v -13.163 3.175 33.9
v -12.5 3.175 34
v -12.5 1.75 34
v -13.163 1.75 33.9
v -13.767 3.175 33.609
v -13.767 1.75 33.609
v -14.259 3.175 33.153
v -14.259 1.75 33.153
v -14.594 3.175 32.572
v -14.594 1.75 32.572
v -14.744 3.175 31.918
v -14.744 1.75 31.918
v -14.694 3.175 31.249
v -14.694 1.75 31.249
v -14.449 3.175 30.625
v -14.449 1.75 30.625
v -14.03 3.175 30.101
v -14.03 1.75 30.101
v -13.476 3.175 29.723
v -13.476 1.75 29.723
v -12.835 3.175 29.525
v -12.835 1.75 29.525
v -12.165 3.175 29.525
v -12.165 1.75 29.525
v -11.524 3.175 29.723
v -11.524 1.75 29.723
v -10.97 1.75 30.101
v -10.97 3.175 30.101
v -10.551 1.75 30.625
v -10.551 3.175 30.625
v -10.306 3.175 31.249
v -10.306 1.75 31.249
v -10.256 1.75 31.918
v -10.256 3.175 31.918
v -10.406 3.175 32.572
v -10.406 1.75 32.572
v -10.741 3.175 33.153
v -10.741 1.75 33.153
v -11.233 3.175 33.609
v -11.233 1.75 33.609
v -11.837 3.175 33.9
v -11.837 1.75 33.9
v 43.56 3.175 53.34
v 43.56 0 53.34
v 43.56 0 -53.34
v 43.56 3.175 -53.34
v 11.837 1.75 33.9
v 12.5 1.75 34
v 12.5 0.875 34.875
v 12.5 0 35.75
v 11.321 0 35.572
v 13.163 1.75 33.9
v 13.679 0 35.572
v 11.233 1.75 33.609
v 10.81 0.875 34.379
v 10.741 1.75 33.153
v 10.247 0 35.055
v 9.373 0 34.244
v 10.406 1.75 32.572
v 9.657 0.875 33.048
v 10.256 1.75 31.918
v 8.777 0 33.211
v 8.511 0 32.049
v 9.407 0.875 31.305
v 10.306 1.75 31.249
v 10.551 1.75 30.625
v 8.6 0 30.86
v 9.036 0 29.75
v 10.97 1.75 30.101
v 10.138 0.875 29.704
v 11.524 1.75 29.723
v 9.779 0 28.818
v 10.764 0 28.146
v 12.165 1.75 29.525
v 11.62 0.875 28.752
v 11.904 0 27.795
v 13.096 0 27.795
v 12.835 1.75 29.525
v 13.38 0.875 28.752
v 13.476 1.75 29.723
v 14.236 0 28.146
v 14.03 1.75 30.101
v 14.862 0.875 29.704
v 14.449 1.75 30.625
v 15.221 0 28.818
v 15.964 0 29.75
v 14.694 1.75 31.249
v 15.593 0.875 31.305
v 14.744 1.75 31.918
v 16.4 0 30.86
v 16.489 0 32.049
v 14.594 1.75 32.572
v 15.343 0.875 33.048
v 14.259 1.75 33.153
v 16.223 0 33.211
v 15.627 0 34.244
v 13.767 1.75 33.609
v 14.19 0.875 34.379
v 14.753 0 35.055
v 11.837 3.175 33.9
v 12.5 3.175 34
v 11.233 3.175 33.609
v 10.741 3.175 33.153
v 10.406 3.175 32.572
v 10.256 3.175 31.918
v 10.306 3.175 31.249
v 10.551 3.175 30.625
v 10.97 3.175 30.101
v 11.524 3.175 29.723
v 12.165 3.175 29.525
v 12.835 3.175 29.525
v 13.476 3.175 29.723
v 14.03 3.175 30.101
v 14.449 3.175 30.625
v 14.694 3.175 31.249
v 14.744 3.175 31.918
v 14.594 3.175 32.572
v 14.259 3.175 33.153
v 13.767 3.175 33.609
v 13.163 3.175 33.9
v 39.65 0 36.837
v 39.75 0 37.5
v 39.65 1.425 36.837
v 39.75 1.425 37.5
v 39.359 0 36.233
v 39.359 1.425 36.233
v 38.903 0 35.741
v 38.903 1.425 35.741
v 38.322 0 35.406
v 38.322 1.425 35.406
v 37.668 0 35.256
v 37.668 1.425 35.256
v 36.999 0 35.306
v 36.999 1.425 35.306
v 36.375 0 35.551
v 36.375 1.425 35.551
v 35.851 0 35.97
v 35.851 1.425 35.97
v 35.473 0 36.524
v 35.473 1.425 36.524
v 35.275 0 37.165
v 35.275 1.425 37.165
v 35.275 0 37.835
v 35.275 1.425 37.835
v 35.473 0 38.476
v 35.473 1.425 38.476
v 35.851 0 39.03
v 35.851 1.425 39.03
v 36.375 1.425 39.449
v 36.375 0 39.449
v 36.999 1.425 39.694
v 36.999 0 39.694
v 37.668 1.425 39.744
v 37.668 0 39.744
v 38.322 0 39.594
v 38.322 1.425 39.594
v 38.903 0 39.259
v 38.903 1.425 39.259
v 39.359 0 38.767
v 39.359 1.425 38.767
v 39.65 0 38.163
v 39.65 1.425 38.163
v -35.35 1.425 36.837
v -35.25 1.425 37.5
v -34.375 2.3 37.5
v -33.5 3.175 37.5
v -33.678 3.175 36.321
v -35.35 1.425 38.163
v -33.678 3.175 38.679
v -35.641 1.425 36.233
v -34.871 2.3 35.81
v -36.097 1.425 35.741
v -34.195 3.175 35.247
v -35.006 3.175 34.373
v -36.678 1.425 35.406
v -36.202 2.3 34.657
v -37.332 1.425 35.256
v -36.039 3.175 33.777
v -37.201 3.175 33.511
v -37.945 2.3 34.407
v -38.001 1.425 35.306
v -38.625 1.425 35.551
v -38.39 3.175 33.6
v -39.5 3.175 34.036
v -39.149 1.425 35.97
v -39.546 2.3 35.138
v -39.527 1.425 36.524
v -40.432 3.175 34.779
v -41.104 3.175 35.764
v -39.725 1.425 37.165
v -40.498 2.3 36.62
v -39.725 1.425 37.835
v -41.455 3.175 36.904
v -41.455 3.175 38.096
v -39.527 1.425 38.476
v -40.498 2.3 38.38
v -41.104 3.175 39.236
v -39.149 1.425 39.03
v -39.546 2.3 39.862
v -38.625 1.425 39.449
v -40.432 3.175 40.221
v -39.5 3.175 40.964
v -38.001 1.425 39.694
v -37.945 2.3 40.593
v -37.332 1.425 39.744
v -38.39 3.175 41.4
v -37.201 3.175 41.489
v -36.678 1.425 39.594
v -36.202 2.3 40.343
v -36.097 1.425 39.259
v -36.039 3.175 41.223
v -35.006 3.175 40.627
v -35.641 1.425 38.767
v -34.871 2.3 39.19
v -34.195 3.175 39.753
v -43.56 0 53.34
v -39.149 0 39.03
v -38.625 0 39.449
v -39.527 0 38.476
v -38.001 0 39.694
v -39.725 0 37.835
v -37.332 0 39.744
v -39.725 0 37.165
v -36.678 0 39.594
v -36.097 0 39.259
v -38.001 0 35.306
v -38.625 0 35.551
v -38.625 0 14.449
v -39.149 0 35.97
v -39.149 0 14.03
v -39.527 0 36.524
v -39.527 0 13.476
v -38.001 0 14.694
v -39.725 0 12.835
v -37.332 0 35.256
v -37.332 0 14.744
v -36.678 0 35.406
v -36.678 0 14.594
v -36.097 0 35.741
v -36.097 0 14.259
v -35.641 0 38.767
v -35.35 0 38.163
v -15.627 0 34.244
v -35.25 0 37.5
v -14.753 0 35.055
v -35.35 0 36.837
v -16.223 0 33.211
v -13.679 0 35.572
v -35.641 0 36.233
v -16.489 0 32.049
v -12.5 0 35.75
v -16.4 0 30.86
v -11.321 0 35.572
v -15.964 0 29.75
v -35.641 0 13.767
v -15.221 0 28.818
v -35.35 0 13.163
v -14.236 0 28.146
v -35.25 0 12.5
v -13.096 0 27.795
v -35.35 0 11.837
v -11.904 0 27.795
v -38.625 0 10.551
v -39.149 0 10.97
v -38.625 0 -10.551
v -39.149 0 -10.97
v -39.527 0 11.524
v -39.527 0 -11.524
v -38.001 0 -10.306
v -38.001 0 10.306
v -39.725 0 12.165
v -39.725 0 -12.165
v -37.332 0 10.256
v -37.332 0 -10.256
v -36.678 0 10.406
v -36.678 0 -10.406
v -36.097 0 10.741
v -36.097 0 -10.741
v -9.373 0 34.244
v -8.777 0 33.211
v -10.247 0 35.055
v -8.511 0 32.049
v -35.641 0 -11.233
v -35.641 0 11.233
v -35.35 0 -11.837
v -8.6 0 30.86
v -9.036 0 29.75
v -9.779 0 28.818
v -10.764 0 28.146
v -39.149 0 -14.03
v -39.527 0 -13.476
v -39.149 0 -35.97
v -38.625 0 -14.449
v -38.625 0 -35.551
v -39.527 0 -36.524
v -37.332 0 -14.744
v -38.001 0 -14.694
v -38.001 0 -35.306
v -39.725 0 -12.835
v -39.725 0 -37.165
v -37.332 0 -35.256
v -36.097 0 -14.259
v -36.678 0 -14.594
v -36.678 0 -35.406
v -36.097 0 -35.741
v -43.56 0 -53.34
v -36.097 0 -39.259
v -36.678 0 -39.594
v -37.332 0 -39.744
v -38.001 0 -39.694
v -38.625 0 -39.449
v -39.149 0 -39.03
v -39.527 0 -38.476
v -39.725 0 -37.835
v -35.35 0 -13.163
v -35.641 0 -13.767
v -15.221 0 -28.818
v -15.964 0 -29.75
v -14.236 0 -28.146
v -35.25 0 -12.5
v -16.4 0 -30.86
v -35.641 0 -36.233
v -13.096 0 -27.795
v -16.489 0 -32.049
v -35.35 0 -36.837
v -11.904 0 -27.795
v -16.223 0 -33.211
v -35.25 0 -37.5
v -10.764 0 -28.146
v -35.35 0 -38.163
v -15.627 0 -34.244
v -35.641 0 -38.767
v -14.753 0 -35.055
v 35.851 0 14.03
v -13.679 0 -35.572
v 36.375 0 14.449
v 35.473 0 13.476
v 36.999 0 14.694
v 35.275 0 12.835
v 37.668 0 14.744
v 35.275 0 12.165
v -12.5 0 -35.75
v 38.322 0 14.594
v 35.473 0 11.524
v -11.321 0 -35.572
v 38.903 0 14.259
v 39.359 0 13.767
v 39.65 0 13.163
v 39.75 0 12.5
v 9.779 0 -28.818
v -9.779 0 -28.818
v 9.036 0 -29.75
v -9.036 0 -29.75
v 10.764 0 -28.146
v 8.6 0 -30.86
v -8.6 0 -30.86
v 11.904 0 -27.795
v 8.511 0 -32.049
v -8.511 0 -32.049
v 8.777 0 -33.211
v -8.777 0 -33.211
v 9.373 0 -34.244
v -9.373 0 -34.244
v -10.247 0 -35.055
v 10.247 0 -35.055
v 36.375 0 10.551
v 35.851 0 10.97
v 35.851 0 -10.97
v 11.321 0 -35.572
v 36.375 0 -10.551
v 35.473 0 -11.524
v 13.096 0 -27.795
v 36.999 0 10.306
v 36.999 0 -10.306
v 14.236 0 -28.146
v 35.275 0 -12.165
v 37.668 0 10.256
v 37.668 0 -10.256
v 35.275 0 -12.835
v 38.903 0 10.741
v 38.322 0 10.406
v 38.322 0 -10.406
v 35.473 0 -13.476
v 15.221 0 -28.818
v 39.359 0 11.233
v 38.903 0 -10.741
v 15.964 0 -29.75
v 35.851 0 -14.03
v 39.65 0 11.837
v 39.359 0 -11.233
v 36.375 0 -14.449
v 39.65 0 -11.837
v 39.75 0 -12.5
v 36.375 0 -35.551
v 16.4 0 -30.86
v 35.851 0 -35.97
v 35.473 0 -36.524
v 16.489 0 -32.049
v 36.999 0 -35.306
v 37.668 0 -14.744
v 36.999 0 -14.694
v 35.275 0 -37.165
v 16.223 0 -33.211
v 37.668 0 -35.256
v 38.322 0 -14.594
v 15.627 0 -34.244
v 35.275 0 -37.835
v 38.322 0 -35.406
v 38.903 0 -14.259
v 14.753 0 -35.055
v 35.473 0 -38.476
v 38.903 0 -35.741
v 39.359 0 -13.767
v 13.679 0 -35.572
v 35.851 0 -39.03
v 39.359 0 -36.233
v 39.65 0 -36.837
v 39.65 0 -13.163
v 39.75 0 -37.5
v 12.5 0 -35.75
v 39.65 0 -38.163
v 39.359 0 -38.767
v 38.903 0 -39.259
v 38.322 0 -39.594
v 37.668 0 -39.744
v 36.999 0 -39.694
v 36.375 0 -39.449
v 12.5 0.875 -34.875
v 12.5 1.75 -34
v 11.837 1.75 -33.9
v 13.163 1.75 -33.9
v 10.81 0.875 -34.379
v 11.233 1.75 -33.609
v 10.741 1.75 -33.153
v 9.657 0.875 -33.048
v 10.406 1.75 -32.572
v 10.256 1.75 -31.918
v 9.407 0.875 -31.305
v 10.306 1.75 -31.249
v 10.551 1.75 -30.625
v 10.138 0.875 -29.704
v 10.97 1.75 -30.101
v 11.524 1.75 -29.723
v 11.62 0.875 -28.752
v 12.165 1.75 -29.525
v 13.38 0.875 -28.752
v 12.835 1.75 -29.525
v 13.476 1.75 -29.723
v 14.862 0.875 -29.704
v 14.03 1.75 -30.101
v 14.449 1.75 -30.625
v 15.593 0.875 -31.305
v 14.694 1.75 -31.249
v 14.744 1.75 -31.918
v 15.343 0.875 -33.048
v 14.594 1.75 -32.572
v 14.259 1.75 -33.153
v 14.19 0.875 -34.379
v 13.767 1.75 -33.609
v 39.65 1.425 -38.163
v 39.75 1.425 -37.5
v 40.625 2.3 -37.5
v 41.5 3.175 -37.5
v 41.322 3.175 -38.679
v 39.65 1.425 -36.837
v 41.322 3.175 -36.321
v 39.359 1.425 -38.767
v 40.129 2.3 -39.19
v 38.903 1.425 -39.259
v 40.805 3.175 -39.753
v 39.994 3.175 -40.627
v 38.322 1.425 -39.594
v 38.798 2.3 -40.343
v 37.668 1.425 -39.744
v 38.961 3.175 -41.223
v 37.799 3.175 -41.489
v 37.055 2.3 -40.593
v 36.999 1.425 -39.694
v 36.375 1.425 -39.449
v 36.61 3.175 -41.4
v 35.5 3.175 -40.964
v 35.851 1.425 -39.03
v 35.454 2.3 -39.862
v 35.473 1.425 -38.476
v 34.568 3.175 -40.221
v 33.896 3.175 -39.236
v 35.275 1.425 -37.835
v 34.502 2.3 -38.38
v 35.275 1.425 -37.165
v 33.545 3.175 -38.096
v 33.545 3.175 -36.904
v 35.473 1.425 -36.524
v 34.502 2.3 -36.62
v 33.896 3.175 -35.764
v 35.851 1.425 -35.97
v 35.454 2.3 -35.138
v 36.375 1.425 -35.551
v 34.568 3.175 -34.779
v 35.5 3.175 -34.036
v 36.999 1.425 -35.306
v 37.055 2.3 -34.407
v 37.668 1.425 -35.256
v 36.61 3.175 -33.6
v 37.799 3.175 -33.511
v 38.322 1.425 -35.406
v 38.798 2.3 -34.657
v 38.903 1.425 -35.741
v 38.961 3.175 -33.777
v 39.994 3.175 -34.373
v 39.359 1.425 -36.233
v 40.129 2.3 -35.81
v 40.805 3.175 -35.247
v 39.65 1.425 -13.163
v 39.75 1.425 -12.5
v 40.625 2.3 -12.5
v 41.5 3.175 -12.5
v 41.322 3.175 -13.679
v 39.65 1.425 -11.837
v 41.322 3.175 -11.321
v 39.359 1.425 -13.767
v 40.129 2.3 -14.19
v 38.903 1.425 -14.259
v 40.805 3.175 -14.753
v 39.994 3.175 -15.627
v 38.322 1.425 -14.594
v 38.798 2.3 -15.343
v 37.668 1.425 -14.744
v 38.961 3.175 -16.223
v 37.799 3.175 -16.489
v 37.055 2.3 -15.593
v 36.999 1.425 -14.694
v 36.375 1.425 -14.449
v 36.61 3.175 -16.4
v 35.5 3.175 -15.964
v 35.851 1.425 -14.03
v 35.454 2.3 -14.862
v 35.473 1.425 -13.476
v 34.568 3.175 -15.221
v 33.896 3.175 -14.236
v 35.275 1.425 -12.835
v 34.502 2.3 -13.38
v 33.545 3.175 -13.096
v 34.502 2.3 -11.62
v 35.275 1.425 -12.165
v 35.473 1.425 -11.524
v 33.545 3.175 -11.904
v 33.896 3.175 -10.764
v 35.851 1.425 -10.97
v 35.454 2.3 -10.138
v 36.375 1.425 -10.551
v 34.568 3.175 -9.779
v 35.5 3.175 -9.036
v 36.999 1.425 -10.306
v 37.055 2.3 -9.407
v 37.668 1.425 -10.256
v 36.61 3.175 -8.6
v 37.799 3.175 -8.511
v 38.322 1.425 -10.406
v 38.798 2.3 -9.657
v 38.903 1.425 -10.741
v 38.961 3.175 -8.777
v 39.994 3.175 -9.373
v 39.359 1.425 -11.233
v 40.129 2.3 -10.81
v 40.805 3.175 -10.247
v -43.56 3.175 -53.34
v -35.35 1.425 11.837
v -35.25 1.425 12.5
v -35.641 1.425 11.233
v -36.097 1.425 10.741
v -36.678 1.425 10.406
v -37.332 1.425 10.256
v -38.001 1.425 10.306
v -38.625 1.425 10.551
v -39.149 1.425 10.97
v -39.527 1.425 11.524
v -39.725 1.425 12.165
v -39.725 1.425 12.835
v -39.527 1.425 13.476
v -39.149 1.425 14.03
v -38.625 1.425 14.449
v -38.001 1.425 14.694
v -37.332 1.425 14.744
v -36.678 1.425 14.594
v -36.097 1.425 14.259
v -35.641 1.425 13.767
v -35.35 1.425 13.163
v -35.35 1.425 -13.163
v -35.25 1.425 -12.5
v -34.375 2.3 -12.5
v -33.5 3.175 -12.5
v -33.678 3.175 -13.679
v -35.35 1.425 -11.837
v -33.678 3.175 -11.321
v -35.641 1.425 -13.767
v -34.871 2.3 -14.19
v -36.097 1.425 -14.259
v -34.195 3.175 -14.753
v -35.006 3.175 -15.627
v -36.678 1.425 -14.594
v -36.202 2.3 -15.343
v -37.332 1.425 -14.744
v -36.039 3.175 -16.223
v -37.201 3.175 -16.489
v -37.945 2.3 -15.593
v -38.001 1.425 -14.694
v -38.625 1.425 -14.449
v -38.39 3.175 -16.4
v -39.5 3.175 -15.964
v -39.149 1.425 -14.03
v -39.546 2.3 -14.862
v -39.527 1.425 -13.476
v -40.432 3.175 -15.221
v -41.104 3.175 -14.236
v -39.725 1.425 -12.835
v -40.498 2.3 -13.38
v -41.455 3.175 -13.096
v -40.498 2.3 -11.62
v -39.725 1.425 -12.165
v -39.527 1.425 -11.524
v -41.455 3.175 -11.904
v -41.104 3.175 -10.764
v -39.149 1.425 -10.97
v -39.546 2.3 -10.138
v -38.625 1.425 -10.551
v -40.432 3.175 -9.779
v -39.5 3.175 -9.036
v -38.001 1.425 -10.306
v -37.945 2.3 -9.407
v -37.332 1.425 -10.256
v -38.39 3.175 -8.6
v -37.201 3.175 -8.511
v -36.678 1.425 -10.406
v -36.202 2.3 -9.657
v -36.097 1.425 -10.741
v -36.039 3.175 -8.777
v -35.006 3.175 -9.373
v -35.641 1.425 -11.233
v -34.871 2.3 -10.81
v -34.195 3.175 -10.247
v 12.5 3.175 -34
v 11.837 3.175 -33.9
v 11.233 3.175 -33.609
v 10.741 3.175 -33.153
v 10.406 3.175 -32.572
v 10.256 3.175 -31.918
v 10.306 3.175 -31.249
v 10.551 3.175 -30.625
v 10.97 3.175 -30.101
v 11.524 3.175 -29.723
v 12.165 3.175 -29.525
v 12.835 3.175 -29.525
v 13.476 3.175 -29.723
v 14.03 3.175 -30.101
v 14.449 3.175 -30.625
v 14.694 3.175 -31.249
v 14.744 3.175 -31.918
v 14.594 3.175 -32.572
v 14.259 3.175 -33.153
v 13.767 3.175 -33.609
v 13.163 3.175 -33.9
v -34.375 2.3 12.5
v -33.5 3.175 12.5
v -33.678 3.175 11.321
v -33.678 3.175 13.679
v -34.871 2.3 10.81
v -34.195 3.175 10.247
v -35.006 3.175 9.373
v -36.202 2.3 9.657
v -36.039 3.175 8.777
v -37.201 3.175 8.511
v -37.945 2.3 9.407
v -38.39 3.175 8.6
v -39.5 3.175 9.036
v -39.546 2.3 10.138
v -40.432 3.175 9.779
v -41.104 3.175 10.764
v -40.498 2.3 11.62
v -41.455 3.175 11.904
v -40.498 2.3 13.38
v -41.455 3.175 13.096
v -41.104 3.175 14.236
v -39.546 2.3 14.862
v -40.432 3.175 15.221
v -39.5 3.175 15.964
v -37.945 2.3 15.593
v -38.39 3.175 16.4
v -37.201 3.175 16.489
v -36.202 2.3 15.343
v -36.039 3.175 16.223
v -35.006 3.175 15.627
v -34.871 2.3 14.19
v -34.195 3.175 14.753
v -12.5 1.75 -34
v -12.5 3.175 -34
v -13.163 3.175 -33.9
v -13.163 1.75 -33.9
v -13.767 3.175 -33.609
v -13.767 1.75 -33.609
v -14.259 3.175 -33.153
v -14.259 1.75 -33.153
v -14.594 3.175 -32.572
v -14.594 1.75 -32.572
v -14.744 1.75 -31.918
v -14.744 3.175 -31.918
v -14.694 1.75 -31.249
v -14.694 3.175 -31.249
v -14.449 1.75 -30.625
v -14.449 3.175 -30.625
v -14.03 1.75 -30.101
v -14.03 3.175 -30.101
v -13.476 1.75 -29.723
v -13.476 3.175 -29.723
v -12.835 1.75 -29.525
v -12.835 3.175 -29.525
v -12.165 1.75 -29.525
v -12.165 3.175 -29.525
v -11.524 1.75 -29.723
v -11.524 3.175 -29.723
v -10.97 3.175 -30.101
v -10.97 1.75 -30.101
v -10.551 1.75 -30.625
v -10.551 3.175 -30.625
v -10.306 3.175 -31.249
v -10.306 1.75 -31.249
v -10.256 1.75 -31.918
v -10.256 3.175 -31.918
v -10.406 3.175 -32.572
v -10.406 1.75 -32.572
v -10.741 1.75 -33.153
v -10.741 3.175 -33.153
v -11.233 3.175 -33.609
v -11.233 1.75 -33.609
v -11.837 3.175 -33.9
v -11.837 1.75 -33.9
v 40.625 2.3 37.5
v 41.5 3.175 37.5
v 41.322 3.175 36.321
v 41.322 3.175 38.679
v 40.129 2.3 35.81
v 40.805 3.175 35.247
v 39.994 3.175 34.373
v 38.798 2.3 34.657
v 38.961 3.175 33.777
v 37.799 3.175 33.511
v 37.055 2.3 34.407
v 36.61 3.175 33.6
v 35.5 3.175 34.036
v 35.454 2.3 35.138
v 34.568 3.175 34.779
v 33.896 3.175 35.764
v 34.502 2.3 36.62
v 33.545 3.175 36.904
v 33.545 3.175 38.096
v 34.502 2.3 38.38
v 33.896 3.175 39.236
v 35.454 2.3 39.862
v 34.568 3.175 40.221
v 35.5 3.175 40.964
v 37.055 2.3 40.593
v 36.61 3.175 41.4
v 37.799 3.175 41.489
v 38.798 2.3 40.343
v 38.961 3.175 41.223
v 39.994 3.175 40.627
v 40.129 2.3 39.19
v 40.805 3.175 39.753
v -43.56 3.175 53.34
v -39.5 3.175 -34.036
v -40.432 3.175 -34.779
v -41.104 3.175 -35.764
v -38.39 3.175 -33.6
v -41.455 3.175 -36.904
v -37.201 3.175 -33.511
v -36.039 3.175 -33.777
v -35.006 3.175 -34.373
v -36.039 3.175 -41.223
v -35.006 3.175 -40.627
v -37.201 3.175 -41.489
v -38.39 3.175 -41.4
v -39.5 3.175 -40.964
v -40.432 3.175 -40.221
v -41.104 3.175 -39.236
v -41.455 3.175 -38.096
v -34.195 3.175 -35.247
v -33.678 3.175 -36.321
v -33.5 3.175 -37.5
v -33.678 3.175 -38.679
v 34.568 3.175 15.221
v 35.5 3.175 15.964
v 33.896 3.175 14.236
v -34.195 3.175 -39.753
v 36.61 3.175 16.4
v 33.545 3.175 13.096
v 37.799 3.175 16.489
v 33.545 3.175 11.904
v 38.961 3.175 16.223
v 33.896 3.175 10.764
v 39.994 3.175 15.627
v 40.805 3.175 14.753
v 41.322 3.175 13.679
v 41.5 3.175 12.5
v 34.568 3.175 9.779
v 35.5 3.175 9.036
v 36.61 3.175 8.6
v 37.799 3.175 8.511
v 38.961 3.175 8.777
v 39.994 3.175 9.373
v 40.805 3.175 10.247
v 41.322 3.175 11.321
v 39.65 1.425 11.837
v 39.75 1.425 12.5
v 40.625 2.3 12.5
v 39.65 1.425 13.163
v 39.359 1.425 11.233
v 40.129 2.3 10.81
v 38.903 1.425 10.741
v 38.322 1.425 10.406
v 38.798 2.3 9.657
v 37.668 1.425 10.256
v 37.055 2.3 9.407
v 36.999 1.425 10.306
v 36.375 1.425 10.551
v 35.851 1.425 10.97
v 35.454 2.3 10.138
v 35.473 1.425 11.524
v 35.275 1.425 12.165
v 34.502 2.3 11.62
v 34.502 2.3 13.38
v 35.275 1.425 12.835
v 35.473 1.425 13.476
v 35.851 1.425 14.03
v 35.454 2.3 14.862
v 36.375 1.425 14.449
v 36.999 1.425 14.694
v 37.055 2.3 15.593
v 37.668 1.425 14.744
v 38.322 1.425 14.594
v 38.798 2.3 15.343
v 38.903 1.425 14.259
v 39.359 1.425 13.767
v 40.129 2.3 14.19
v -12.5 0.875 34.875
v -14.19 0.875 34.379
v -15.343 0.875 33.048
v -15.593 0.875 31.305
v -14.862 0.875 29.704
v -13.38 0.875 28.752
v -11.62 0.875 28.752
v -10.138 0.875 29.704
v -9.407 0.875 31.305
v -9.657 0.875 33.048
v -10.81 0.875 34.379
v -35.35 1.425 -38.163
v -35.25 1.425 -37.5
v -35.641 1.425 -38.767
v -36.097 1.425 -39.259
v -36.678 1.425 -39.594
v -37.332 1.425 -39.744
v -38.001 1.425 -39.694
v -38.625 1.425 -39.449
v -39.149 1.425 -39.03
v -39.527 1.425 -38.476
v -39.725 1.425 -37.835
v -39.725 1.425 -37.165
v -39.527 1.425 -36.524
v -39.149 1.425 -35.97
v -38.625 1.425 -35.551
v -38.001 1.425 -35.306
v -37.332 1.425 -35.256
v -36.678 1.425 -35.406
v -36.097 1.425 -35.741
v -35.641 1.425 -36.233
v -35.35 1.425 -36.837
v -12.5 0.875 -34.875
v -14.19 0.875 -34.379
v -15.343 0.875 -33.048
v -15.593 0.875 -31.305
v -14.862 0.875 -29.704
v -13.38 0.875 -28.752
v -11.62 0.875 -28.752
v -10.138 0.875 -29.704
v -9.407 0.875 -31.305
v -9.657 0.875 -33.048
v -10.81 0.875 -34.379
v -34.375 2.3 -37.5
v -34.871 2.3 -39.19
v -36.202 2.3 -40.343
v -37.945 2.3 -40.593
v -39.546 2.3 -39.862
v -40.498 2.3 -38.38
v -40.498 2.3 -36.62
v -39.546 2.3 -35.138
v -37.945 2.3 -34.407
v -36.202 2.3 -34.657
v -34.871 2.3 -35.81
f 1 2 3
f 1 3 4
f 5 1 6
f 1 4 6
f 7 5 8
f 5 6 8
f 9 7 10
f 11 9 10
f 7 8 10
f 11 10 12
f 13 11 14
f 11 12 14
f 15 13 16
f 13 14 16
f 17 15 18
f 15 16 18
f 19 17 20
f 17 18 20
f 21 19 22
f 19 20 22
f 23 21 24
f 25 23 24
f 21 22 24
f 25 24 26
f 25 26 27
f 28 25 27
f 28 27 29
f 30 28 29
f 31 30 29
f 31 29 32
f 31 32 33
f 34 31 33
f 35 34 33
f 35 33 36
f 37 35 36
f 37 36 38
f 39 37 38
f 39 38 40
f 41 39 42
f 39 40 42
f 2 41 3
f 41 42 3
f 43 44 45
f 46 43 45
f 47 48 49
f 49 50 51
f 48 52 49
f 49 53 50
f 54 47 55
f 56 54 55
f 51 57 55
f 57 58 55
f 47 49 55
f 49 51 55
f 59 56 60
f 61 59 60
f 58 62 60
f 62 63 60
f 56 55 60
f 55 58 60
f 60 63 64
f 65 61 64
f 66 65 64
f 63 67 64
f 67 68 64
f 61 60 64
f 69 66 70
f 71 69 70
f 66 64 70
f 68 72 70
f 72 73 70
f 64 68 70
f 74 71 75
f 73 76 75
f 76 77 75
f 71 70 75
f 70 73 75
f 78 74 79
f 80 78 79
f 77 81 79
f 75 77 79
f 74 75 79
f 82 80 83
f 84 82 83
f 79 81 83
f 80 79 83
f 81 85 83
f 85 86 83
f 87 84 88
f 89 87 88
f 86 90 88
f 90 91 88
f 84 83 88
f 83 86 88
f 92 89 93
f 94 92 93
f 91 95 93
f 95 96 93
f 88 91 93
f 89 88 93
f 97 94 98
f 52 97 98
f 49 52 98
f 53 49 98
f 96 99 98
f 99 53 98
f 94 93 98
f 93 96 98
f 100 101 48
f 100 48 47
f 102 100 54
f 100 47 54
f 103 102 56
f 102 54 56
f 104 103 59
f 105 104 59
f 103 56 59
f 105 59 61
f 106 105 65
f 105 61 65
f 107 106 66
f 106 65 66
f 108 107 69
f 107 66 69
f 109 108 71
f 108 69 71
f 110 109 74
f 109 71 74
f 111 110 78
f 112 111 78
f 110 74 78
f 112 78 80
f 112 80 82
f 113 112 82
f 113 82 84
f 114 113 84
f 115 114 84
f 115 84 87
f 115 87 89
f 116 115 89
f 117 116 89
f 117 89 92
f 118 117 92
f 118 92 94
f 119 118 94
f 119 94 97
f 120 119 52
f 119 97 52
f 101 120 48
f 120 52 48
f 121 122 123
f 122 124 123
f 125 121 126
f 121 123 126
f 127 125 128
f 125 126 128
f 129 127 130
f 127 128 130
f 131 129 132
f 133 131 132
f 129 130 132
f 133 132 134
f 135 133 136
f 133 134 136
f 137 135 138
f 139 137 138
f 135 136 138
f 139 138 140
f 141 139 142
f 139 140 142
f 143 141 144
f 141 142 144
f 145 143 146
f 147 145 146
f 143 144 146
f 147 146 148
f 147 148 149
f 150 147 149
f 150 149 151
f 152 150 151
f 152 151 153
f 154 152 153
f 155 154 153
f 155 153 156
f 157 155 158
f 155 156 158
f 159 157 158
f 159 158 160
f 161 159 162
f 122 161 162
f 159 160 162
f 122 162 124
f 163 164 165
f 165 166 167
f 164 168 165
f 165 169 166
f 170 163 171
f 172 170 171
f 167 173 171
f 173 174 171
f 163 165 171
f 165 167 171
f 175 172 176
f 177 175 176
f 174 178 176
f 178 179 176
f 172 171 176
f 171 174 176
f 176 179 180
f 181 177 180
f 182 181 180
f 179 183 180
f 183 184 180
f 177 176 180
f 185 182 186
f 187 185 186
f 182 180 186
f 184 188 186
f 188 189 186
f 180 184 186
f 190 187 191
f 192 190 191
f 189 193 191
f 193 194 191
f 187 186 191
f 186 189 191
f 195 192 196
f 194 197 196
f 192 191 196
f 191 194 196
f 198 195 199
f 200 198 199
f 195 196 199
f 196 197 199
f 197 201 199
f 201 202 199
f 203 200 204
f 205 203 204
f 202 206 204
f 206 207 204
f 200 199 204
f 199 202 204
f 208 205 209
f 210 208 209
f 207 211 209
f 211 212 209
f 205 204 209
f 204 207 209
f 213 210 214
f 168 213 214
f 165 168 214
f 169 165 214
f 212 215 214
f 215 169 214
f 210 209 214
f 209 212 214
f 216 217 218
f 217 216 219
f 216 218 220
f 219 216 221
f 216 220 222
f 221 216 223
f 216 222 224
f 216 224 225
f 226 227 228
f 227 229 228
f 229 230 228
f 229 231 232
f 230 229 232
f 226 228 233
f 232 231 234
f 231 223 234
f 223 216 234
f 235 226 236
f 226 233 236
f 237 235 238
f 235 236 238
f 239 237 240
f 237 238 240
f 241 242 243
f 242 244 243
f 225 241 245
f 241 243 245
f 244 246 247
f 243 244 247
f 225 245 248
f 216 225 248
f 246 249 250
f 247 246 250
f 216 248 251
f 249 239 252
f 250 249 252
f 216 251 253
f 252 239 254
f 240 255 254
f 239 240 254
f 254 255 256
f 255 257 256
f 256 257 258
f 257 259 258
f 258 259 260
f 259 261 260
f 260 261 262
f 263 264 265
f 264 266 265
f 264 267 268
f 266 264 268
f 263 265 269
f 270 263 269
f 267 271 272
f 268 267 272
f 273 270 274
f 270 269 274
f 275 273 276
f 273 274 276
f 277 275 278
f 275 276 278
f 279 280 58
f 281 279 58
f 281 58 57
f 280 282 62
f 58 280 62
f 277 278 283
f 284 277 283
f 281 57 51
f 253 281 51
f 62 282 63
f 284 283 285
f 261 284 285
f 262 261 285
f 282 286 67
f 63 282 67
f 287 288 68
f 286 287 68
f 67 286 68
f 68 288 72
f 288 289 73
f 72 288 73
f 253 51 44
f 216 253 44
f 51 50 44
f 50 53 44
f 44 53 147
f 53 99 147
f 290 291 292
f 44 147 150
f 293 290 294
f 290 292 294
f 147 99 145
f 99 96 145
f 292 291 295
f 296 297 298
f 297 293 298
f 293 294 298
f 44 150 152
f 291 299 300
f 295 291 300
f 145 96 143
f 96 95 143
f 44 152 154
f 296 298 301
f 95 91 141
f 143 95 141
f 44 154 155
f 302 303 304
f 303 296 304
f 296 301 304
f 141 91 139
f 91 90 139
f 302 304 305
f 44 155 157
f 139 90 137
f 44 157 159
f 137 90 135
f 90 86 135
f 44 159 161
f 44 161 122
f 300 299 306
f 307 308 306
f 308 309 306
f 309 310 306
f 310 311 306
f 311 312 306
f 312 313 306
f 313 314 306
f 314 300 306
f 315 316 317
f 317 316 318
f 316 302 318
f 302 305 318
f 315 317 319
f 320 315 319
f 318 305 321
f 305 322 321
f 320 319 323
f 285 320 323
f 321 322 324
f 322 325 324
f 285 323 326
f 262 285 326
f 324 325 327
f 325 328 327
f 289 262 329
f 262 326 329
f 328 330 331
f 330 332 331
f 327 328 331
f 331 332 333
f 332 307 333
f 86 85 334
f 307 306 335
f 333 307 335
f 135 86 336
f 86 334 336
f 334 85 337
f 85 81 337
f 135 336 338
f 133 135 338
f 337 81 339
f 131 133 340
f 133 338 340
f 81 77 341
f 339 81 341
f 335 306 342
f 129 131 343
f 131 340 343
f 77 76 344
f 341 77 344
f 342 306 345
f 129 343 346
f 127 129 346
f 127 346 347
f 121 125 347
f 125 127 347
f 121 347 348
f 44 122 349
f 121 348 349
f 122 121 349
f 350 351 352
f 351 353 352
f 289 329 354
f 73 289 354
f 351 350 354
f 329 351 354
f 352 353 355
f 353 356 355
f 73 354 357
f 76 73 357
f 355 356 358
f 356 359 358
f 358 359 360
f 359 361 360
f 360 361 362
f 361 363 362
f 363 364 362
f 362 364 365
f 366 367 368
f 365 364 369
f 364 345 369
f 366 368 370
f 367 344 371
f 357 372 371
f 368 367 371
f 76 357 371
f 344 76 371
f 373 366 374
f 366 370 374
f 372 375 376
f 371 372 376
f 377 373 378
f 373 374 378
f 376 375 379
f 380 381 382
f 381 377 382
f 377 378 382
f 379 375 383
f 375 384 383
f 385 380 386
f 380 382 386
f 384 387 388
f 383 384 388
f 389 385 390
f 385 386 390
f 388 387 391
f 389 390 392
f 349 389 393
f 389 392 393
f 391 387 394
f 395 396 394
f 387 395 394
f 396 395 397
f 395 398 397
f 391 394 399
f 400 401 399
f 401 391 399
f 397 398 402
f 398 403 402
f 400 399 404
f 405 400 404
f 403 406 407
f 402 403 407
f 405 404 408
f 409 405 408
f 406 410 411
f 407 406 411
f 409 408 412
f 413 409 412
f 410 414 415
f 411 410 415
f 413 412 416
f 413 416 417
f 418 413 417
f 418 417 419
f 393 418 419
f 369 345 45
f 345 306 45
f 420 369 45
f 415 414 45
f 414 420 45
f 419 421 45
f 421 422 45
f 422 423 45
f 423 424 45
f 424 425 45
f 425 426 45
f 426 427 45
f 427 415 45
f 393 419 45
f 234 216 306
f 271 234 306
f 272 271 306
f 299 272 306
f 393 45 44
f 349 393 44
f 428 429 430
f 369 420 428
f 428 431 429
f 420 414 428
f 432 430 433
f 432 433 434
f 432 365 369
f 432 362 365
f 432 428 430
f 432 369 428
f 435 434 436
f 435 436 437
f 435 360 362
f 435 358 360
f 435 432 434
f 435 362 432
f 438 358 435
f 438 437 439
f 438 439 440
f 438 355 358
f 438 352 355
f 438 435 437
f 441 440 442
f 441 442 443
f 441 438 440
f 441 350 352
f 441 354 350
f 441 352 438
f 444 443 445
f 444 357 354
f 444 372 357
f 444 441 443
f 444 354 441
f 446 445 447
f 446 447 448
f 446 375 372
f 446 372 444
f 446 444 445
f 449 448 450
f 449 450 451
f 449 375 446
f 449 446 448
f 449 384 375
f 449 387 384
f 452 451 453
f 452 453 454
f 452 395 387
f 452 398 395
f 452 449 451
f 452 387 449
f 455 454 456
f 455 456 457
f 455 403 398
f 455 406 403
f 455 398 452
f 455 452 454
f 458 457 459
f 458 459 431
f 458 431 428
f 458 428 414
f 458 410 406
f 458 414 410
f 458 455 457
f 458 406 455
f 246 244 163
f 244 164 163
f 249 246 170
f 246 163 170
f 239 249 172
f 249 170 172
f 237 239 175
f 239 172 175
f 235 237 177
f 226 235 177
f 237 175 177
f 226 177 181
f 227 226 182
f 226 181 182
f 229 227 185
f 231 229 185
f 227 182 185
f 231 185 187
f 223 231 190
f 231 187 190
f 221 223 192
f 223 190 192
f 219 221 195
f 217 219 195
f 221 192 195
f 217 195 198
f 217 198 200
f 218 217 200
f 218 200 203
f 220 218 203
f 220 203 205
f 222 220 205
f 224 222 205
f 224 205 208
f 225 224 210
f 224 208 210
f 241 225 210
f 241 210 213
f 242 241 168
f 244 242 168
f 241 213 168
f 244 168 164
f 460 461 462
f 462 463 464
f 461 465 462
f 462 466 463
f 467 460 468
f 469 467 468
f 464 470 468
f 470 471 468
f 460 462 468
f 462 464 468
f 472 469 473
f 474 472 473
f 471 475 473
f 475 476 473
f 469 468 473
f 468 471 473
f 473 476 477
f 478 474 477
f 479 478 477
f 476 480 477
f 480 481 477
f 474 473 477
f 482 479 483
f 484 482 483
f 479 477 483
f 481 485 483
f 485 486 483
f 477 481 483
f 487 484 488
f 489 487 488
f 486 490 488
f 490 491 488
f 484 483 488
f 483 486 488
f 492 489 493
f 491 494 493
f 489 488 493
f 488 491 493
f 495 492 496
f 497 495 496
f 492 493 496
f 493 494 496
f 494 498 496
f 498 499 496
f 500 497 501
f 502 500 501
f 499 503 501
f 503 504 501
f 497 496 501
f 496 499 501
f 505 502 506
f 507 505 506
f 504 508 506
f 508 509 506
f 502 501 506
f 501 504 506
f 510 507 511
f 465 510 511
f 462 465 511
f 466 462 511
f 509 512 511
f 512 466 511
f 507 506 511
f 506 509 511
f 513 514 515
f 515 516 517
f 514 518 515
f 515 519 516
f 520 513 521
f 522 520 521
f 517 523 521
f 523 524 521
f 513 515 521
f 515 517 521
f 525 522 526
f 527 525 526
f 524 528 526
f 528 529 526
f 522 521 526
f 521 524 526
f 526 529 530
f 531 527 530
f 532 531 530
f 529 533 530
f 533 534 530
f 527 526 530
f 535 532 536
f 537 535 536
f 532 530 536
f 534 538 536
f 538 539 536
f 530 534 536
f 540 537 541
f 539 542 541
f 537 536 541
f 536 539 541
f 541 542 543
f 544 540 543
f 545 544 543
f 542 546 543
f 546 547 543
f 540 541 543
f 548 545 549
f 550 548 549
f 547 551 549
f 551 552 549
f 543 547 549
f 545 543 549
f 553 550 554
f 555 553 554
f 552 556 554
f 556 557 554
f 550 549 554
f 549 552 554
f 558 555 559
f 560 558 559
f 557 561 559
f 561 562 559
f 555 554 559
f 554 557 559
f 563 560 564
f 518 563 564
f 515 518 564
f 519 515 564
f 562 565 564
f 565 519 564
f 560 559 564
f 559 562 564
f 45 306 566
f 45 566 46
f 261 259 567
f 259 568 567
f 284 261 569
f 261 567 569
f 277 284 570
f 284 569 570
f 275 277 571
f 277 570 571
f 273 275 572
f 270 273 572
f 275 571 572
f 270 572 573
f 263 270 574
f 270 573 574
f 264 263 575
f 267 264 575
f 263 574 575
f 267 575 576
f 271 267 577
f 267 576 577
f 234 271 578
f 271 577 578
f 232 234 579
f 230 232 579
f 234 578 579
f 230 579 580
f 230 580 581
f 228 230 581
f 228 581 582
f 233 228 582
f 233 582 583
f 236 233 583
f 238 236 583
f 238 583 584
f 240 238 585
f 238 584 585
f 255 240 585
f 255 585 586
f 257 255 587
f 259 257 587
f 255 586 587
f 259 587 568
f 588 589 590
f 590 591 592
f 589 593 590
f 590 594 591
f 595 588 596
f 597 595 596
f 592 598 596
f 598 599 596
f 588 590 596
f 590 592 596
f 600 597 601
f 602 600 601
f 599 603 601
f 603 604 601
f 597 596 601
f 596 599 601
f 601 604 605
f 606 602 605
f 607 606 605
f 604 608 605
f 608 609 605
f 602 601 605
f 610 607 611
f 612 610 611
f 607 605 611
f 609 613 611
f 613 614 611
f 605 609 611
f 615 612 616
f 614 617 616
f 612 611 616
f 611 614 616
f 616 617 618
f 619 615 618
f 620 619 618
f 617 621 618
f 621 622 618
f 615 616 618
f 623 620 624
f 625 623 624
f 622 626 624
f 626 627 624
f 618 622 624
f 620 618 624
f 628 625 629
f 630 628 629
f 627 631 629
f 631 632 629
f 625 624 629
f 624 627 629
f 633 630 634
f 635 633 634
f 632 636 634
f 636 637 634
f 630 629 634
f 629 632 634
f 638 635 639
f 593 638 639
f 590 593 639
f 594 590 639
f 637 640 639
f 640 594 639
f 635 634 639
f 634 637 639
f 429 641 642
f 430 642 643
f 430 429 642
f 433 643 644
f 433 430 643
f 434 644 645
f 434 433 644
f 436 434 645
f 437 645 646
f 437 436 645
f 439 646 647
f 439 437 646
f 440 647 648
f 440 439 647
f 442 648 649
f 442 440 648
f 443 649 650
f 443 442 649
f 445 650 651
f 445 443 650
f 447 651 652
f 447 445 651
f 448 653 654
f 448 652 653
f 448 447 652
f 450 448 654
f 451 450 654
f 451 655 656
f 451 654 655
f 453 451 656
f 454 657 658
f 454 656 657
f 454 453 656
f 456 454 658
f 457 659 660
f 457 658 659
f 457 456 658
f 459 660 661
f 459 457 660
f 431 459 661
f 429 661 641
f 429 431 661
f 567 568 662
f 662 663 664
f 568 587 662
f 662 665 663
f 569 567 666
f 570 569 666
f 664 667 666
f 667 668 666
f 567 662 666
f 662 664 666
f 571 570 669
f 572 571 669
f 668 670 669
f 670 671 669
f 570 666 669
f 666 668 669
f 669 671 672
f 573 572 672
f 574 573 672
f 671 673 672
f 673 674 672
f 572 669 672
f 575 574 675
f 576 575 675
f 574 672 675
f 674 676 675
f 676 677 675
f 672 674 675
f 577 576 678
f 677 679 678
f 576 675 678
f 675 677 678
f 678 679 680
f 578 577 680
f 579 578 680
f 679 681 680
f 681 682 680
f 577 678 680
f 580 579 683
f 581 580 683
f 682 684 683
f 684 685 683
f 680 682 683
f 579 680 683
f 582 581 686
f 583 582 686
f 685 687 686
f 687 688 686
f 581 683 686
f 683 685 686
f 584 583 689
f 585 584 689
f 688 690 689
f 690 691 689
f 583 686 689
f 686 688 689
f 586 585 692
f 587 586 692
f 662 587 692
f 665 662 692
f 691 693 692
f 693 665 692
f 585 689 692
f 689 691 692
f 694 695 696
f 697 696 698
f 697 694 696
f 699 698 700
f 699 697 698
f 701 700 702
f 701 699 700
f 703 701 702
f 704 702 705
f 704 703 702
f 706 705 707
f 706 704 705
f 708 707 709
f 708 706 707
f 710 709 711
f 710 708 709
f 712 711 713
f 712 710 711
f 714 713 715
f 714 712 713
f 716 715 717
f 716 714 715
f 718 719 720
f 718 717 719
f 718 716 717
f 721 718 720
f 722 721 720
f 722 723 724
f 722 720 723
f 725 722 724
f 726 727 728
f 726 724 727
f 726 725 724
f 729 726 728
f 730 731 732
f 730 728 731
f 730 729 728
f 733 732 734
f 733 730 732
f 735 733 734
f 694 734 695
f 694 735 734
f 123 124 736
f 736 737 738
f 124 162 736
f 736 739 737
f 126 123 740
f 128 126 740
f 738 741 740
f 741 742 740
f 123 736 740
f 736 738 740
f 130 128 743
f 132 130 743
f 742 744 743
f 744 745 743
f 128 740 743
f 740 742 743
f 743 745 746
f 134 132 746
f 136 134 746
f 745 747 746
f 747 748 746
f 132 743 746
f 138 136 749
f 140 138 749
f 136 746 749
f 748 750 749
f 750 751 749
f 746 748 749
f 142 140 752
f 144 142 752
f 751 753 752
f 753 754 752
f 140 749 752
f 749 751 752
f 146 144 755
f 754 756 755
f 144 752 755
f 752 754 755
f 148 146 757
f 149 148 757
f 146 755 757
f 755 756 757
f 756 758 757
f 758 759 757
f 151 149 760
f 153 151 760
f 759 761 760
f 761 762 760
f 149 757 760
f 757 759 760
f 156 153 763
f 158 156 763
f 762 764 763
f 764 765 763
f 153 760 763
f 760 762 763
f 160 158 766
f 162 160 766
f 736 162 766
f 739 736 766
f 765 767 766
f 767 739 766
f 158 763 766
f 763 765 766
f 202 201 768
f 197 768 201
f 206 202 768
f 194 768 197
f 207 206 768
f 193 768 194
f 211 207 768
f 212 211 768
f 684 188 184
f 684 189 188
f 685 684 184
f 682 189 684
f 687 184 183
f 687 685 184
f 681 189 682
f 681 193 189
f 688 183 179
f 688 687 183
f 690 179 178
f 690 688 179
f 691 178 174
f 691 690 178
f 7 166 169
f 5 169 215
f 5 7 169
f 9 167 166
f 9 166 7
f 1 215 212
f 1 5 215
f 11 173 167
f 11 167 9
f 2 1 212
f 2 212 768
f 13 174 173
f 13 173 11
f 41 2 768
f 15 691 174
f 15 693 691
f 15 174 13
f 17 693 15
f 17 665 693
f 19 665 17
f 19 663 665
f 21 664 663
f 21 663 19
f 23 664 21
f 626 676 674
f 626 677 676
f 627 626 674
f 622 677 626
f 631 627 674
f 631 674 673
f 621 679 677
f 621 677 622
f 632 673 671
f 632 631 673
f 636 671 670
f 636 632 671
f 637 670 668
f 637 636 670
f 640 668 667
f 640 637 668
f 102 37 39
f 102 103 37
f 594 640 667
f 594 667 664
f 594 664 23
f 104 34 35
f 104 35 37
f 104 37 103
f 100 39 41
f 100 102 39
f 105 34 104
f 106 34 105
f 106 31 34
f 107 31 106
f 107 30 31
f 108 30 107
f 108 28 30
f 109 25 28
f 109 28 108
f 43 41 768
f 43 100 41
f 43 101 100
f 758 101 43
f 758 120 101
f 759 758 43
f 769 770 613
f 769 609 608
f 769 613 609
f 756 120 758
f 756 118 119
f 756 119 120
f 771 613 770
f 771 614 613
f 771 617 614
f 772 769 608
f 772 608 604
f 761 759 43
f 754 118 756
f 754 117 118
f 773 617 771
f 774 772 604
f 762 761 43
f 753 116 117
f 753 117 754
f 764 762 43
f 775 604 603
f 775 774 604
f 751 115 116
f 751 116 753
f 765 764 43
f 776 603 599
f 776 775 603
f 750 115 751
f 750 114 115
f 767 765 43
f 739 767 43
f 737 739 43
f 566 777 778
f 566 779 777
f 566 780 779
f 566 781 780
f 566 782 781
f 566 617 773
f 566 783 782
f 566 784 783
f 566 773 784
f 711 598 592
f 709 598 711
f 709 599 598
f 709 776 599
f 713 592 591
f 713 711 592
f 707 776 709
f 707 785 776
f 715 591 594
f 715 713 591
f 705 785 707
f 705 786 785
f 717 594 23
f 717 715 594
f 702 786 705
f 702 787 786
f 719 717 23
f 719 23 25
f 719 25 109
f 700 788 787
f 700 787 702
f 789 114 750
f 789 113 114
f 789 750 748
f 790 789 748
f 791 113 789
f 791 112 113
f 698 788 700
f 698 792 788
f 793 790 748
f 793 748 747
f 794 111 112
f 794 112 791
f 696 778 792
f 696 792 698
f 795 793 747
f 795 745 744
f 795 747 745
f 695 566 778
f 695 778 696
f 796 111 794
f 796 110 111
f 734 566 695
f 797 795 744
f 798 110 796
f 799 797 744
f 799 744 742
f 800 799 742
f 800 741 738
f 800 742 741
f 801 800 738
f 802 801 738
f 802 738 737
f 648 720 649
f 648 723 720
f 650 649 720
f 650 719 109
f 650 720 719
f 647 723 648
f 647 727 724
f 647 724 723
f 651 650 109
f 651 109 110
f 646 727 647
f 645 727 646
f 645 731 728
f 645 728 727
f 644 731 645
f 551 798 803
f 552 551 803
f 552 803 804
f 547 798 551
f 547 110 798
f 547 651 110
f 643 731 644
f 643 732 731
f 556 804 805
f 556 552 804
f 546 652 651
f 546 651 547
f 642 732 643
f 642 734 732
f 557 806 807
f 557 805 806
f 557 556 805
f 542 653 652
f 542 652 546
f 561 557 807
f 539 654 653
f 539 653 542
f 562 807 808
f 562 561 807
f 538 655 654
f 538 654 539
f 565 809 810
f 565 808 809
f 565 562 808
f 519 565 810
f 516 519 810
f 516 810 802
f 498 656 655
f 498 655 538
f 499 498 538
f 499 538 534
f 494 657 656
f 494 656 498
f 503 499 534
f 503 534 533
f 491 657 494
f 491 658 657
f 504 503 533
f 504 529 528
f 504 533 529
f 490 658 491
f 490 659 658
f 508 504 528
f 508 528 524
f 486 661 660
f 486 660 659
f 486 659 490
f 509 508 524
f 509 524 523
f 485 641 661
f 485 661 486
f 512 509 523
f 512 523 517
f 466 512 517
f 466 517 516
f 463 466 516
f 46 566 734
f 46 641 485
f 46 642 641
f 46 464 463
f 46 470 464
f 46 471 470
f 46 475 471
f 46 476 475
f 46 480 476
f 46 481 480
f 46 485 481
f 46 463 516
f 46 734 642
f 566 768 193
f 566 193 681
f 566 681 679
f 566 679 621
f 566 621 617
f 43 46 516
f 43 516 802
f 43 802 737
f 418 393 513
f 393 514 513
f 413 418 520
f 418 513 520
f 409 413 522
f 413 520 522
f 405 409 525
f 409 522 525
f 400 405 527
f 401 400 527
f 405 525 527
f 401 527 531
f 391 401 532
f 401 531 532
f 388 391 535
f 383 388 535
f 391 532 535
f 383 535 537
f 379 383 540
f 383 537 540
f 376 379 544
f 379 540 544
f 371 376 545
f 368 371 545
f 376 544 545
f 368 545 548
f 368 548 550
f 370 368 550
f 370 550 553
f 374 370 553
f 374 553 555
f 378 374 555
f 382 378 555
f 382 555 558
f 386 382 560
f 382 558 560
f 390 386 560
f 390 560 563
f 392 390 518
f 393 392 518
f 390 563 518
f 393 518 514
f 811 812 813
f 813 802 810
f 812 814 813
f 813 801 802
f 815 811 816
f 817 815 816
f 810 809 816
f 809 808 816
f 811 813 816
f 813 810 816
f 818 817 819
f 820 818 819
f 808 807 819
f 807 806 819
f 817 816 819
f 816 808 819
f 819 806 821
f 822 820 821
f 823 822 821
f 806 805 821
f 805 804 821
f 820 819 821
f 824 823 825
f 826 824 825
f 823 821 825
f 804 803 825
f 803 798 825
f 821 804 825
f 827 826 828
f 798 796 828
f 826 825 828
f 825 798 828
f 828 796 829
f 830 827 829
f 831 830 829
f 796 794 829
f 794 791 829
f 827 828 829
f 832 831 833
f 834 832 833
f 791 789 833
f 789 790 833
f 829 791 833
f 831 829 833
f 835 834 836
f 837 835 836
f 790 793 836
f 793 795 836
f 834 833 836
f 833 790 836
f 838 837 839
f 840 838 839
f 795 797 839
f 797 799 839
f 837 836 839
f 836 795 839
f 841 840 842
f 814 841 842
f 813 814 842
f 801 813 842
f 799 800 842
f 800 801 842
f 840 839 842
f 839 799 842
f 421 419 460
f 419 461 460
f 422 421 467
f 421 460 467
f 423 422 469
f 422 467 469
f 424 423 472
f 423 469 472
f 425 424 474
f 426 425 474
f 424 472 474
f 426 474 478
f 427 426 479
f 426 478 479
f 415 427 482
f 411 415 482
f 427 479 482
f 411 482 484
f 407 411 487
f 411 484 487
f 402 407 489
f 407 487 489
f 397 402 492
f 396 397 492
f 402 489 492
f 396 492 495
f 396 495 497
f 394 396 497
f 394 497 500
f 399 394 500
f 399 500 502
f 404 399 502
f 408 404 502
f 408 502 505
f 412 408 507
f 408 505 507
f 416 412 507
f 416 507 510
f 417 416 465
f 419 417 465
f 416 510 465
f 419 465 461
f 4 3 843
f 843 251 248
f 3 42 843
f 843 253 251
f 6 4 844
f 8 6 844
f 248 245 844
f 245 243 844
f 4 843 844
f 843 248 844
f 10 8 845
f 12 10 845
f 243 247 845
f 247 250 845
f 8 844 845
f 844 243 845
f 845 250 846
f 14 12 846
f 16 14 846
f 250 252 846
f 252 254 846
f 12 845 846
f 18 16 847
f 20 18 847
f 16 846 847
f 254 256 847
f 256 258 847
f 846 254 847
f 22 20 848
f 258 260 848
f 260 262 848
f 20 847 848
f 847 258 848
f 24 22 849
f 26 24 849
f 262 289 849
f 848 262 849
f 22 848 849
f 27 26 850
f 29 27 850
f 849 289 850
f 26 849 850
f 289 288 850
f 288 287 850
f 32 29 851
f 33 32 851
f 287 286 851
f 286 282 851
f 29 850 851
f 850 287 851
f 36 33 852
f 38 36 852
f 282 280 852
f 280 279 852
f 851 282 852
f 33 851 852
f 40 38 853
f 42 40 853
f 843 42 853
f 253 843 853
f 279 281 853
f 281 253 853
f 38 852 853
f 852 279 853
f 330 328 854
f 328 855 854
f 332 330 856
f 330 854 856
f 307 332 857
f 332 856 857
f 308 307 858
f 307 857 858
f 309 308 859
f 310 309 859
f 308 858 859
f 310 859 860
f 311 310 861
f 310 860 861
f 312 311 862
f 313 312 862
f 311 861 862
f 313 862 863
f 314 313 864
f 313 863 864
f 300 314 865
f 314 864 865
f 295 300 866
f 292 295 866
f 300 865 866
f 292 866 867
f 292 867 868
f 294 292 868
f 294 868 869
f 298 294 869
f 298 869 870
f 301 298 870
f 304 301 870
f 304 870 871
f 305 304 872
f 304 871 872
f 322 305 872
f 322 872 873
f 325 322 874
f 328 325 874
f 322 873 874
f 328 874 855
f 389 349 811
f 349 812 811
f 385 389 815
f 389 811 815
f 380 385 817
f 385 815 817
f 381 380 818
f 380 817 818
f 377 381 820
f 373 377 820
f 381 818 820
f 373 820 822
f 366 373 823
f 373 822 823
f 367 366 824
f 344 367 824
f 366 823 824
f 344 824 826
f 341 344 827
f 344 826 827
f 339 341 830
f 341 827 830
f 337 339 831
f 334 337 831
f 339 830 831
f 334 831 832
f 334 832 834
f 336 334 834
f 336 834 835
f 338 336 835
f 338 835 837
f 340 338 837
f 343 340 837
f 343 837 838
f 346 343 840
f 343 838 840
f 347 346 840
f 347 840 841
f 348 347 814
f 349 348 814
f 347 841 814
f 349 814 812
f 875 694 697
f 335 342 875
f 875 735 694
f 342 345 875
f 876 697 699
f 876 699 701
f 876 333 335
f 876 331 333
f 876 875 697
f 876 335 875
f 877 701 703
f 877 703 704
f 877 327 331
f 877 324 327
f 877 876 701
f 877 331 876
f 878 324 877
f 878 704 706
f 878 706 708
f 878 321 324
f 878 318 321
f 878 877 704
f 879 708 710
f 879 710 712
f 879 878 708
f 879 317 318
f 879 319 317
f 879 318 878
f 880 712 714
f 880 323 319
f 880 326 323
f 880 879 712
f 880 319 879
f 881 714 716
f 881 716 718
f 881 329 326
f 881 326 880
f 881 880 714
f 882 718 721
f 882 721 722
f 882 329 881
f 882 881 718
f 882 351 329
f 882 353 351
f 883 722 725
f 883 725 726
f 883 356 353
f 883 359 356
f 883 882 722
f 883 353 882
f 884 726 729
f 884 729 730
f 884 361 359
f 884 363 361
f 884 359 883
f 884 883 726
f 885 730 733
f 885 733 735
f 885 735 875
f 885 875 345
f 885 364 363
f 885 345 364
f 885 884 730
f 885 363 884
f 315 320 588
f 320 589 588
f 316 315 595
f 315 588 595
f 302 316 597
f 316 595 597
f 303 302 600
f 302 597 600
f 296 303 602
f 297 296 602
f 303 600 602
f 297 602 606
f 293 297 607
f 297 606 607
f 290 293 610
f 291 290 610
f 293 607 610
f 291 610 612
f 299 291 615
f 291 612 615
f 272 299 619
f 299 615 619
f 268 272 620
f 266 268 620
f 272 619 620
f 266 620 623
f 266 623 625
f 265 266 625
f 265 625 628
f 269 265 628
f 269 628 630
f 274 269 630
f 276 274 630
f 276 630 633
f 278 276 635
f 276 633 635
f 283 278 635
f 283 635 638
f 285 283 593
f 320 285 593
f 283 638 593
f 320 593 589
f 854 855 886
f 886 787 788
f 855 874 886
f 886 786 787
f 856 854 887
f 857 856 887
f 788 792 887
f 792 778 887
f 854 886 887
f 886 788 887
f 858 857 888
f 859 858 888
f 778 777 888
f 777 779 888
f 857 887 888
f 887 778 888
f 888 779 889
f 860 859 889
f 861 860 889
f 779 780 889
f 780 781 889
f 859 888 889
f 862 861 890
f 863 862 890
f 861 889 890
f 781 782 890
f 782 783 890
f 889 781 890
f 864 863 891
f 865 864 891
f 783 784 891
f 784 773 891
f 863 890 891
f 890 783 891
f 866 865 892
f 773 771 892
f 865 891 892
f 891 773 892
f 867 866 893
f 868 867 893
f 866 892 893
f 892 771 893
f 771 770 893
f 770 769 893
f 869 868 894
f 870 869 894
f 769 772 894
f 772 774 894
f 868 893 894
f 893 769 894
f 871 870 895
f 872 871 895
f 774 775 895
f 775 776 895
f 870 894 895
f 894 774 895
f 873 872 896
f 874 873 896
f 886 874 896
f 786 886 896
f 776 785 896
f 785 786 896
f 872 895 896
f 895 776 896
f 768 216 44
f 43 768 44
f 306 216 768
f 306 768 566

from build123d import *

# Parameters (mm, degrees)
SKETCH2_W                    = 87.12
SKETCH2_H                    = 106.68
BOSS_EXTRUDE1_DEPTH          = 3.175
CSK_FOR_M4_SFHCS1_AT_2_COUNT = 2
CSK_FOR_M4_SFHCS1_AT_2_PITCH = 25


# Read off the part's stored shape, not the designer's step: AdvancedHole2
with BuildPart() as part:
    # Sketch2 → Boss-Extrude1 (new body)
    with BuildSketch(Plane(origin=(0, 0, 0), x_dir=(1, 0, 0), z_dir=(0, 1, 0))):
        Rectangle(SKETCH2_W, SKETCH2_H)
    extrude(amount=BOSS_EXTRUDE1_DEPTH)

    # AdvancedHole2 outline → AdvancedHole2 (revolve, cut)
    with BuildSketch(Plane(origin=(-37.5, 0, 12.5), x_dir=(1, 0, 0), z_dir=(0, 0, 1))):
        Polygon((4, 3.175), (0, 3.175), (0, 0), (2.25, 0), (2.25, 1.425), align=None)
    revolve(axis=Axis((-37.5, 0, 12.5), (0, 1, 0)), mode=Mode.SUBTRACT)

    # AdvancedHole2 2 outline → AdvancedHole2 2 (revolve, cut)
    with BuildSketch(Plane(origin=(-37.5, 0, 37.5), x_dir=(1, 0, 0), z_dir=(0, 0, 1))):
        Polygon((4, 3.175), (0, 3.175), (0, 0), (2.25, 0), (2.25, 1.425), align=None)
    revolve(axis=Axis((-37.5, 0, 37.5), (0, 1, 0)), mode=Mode.SUBTRACT)

    # AdvancedHole2 3 outline → AdvancedHole2 3 (revolve, cut)
    with BuildSketch(Plane(origin=(37.5, 0, 37.5), x_dir=(1, 0, 0), z_dir=(0, 0, 1))):
        Polygon((4, 3.175), (0, 3.175), (0, 0), (2.25, 0), (2.25, 1.425), align=None)
    revolve(axis=Axis((37.5, 0, 37.5), (0, 1, 0)), mode=Mode.SUBTRACT)

    # AdvancedHole2 4 outline → AdvancedHole2 4 (revolve, cut)
    with BuildSketch(Plane(origin=(37.5, 0, 12.5), x_dir=(1, 0, 0), z_dir=(0, 0, 1))):
        Polygon((4, 3.175), (0, 3.175), (0, 0), (2.25, 0), (2.25, 1.425), align=None)
    revolve(axis=Axis((37.5, 0, 12.5), (0, 1, 0)), mode=Mode.SUBTRACT)

    # AdvancedHole2 5 outline → AdvancedHole2 5 (revolve, cut)
    with BuildSketch(Plane(origin=(37.5, 0, -12.5), x_dir=(1, 0, 0), z_dir=(0, 0, 1))):
        Polygon((4, 3.175), (0, 3.175), (0, 0), (2.25, 0), (2.25, 1.425), align=None)
    revolve(axis=Axis((37.5, 0, -12.5), (0, 1, 0)), mode=Mode.SUBTRACT)

    # AdvancedHole2 6 outline → AdvancedHole2 6 (revolve, cut)
    with BuildSketch(Plane(origin=(37.5, 0, -37.5), x_dir=(1, 0, 0), z_dir=(0, 0, 1))):
        Polygon((4, 3.175), (0, 3.175), (0, 0), (2.25, 0), (2.25, 1.425), align=None)
    revolve(axis=Axis((37.5, 0, -37.5), (0, 1, 0)), mode=Mode.SUBTRACT)

    # AdvancedHole2 7 outline → AdvancedHole2 7 (revolve, cut)
    with BuildSketch(Plane(origin=(-37.5, 0, -12.5), x_dir=(1, 0, 0), z_dir=(0, 0, 1))):
        Polygon((4, 3.175), (0, 3.175), (0, 0), (2.25, 0), (2.25, 1.425), align=None)
    revolve(axis=Axis((-37.5, 0, -12.5), (0, 1, 0)), mode=Mode.SUBTRACT)

    # AdvancedHole2 8 outline → AdvancedHole2 8 (revolve, cut)
    with BuildSketch(Plane(origin=(-37.5, 0, -37.5), x_dir=(1, 0, 0), z_dir=(0, 0, 1))):
        Polygon((4, 3.175), (0, 3.175), (0, 0), (2.25, 0), (2.25, 1.425), align=None)
    revolve(axis=Axis((-37.5, 0, -37.5), (0, 1, 0)), mode=Mode.SUBTRACT)

    # Sketch21 → CSK for M4 SFHCS1 (revolve, cut)
    with BuildSketch(Plane(origin=(12.5, 0, -31.75), x_dir=(0, 0, -1), z_dir=(1, 0, 0))):
        Polygon((0, 0), (0, 11.351936393), (2.25, 10), (2.25, 1.75), (4, 0), align=None)
    csk_for_m4_sfhcs1 = revolve(axis=Axis((12.5, -6.35, -31.75), (0, 1, 0)), mode=Mode.SUBTRACT)

    # CSK for M4 SFHCS1 at 2: CSK for M4 SFHCS1 ×2
    with Locations(*[(-i * CSK_FOR_M4_SFHCS1_AT_2_PITCH, 0, 0) for i in range(1, CSK_FOR_M4_SFHCS1_AT_2_COUNT)]):
        add(csk_for_m4_sfhcs1, mode=Mode.SUBTRACT)

    # Mirror1: CSK for M4 SFHCS1 across plane
    add(csk_for_m4_sfhcs1.mirror(Plane.XY), mode=Mode.SUBTRACT)

    # Mirror1 copy 1 sketch → Mirror1 copy 1 (revolve, cut)
    with BuildSketch(Plane(origin=(-12.5, 0, 31.75), x_dir=(0, 0, 1), z_dir=(1, 0, 0))):
        Polygon((0, 0), (0, -11.351936393), (2.25, -10), (2.25, -1.75), (4, 0), align=None)
    revolve(axis=Axis((-12.5, -6.35, 31.75), (0, -1, 0)), mode=Mode.SUBTRACT)


solid = part.part
